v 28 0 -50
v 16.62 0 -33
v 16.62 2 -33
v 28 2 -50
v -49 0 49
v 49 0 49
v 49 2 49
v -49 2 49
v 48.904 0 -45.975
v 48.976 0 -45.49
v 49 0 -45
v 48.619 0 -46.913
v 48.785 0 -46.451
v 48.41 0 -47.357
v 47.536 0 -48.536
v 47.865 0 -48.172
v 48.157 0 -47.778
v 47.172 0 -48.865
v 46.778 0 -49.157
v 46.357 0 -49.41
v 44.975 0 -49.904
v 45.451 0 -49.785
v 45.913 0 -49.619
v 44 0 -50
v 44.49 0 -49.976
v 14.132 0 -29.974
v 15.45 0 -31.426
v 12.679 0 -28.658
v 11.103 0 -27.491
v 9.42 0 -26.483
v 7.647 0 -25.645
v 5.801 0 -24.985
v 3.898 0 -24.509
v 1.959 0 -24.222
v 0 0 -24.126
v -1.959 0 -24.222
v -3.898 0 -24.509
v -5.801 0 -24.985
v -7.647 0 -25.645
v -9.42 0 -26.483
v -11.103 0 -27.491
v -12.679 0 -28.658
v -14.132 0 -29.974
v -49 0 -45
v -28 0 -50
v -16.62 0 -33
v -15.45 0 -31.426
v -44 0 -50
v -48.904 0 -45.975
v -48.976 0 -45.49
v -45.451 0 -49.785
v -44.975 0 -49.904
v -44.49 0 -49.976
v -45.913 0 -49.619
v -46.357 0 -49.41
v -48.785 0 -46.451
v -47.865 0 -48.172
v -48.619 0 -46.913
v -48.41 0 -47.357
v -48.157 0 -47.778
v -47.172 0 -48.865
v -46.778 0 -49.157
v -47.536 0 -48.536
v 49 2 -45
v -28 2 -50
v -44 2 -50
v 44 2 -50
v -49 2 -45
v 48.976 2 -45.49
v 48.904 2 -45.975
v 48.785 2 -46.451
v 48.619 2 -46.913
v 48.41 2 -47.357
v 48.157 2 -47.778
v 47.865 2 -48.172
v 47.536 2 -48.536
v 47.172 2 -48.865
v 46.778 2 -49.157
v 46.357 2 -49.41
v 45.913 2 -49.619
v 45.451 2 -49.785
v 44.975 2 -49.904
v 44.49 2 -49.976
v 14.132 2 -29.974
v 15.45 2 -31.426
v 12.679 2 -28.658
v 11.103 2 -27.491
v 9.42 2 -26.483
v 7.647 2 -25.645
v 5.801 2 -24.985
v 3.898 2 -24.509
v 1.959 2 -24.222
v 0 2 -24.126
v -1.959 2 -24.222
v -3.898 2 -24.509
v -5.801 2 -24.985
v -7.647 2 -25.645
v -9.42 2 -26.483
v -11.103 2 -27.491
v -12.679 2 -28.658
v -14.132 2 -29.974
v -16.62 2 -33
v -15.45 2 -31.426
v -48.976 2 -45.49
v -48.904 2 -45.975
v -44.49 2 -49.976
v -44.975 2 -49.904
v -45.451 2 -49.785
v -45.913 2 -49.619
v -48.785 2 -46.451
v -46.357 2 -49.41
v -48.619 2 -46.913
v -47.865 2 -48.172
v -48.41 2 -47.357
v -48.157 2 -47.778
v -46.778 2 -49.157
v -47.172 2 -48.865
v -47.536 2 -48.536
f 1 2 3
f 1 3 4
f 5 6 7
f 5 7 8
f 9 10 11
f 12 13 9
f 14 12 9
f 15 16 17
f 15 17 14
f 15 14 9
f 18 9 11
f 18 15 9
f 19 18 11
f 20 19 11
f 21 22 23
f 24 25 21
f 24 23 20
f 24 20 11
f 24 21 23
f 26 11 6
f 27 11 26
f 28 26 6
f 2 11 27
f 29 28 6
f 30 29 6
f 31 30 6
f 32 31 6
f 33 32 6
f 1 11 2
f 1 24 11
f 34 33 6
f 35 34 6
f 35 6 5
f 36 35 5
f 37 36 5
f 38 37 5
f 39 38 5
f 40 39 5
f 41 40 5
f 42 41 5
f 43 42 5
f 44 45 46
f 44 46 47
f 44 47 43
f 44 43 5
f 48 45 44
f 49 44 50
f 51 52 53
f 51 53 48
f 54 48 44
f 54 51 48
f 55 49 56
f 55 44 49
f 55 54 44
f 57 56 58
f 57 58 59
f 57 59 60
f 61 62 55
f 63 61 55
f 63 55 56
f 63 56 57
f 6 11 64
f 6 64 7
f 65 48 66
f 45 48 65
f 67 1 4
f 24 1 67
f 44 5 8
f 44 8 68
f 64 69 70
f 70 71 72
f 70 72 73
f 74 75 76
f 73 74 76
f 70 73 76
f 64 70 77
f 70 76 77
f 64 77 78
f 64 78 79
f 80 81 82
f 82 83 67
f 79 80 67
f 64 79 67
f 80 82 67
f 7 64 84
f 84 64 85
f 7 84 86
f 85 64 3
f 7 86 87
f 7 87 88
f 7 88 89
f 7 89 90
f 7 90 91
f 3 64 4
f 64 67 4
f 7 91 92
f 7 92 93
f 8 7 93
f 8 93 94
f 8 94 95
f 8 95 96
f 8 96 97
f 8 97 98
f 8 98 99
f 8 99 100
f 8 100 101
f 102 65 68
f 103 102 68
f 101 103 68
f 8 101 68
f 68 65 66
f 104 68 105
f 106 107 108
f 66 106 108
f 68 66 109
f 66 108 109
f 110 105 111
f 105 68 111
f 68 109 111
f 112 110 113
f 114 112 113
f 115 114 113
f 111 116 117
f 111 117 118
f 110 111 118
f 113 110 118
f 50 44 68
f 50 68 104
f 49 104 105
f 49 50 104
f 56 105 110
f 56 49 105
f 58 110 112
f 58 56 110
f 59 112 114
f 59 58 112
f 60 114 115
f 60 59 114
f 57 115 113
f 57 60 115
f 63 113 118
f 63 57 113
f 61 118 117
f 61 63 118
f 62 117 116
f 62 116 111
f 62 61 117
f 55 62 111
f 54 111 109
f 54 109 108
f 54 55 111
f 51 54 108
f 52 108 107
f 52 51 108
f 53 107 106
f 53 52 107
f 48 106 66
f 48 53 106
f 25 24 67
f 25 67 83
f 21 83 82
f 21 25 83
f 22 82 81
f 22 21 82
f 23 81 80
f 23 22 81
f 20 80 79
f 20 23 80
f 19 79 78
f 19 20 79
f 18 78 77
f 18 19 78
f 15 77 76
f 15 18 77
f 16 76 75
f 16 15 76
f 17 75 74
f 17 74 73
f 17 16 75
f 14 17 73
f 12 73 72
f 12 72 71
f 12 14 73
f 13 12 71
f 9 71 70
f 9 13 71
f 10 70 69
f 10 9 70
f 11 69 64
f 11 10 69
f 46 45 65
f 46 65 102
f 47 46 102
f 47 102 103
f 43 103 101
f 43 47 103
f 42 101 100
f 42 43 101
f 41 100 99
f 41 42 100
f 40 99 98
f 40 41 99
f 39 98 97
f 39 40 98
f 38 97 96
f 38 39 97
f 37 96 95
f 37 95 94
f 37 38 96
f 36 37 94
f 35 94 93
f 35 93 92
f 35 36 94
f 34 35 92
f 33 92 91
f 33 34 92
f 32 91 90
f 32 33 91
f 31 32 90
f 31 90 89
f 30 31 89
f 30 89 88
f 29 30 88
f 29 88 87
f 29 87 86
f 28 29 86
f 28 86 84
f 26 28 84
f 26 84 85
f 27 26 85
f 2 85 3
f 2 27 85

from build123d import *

# Parameters (mm, degrees)
AUFSATZ_LINEAR_AUSTRAGEN2_DEPTH = 2


with BuildPart() as part:
    # Skizze2 → Aufsatz-Linear austragen2 (new body)
    with BuildSketch(Plane(origin=(0, 0, 0), x_dir=(1, 0, 0), z_dir=(0, 1, 0))):
        with BuildLine():
            Line((-44, 50), (-28, 50))
            Line((-28, 50), (-16.61985221, 33))
            ThreePointArc((-16.61985221, 33), (0, 24.125669082), (16.61985221, 33))
            Line((16.61985221, 33), (28, 50))
            Line((28, 50), (44, 50))
            ThreePointArc((44, 50), (47.535533906, 48.535533906), (49, 45))
            Line((49, 45), (49, -49))
            Line((49, -49), (-49, -49))
            Line((-49, -49), (-49, 45))
            ThreePointArc((-49, 45), (-47.535533906, 48.535533906), (-44, 50))
        make_face()
    extrude(amount=AUFSATZ_LINEAR_AUSTRAGEN2_DEPTH)


solid = part.part
